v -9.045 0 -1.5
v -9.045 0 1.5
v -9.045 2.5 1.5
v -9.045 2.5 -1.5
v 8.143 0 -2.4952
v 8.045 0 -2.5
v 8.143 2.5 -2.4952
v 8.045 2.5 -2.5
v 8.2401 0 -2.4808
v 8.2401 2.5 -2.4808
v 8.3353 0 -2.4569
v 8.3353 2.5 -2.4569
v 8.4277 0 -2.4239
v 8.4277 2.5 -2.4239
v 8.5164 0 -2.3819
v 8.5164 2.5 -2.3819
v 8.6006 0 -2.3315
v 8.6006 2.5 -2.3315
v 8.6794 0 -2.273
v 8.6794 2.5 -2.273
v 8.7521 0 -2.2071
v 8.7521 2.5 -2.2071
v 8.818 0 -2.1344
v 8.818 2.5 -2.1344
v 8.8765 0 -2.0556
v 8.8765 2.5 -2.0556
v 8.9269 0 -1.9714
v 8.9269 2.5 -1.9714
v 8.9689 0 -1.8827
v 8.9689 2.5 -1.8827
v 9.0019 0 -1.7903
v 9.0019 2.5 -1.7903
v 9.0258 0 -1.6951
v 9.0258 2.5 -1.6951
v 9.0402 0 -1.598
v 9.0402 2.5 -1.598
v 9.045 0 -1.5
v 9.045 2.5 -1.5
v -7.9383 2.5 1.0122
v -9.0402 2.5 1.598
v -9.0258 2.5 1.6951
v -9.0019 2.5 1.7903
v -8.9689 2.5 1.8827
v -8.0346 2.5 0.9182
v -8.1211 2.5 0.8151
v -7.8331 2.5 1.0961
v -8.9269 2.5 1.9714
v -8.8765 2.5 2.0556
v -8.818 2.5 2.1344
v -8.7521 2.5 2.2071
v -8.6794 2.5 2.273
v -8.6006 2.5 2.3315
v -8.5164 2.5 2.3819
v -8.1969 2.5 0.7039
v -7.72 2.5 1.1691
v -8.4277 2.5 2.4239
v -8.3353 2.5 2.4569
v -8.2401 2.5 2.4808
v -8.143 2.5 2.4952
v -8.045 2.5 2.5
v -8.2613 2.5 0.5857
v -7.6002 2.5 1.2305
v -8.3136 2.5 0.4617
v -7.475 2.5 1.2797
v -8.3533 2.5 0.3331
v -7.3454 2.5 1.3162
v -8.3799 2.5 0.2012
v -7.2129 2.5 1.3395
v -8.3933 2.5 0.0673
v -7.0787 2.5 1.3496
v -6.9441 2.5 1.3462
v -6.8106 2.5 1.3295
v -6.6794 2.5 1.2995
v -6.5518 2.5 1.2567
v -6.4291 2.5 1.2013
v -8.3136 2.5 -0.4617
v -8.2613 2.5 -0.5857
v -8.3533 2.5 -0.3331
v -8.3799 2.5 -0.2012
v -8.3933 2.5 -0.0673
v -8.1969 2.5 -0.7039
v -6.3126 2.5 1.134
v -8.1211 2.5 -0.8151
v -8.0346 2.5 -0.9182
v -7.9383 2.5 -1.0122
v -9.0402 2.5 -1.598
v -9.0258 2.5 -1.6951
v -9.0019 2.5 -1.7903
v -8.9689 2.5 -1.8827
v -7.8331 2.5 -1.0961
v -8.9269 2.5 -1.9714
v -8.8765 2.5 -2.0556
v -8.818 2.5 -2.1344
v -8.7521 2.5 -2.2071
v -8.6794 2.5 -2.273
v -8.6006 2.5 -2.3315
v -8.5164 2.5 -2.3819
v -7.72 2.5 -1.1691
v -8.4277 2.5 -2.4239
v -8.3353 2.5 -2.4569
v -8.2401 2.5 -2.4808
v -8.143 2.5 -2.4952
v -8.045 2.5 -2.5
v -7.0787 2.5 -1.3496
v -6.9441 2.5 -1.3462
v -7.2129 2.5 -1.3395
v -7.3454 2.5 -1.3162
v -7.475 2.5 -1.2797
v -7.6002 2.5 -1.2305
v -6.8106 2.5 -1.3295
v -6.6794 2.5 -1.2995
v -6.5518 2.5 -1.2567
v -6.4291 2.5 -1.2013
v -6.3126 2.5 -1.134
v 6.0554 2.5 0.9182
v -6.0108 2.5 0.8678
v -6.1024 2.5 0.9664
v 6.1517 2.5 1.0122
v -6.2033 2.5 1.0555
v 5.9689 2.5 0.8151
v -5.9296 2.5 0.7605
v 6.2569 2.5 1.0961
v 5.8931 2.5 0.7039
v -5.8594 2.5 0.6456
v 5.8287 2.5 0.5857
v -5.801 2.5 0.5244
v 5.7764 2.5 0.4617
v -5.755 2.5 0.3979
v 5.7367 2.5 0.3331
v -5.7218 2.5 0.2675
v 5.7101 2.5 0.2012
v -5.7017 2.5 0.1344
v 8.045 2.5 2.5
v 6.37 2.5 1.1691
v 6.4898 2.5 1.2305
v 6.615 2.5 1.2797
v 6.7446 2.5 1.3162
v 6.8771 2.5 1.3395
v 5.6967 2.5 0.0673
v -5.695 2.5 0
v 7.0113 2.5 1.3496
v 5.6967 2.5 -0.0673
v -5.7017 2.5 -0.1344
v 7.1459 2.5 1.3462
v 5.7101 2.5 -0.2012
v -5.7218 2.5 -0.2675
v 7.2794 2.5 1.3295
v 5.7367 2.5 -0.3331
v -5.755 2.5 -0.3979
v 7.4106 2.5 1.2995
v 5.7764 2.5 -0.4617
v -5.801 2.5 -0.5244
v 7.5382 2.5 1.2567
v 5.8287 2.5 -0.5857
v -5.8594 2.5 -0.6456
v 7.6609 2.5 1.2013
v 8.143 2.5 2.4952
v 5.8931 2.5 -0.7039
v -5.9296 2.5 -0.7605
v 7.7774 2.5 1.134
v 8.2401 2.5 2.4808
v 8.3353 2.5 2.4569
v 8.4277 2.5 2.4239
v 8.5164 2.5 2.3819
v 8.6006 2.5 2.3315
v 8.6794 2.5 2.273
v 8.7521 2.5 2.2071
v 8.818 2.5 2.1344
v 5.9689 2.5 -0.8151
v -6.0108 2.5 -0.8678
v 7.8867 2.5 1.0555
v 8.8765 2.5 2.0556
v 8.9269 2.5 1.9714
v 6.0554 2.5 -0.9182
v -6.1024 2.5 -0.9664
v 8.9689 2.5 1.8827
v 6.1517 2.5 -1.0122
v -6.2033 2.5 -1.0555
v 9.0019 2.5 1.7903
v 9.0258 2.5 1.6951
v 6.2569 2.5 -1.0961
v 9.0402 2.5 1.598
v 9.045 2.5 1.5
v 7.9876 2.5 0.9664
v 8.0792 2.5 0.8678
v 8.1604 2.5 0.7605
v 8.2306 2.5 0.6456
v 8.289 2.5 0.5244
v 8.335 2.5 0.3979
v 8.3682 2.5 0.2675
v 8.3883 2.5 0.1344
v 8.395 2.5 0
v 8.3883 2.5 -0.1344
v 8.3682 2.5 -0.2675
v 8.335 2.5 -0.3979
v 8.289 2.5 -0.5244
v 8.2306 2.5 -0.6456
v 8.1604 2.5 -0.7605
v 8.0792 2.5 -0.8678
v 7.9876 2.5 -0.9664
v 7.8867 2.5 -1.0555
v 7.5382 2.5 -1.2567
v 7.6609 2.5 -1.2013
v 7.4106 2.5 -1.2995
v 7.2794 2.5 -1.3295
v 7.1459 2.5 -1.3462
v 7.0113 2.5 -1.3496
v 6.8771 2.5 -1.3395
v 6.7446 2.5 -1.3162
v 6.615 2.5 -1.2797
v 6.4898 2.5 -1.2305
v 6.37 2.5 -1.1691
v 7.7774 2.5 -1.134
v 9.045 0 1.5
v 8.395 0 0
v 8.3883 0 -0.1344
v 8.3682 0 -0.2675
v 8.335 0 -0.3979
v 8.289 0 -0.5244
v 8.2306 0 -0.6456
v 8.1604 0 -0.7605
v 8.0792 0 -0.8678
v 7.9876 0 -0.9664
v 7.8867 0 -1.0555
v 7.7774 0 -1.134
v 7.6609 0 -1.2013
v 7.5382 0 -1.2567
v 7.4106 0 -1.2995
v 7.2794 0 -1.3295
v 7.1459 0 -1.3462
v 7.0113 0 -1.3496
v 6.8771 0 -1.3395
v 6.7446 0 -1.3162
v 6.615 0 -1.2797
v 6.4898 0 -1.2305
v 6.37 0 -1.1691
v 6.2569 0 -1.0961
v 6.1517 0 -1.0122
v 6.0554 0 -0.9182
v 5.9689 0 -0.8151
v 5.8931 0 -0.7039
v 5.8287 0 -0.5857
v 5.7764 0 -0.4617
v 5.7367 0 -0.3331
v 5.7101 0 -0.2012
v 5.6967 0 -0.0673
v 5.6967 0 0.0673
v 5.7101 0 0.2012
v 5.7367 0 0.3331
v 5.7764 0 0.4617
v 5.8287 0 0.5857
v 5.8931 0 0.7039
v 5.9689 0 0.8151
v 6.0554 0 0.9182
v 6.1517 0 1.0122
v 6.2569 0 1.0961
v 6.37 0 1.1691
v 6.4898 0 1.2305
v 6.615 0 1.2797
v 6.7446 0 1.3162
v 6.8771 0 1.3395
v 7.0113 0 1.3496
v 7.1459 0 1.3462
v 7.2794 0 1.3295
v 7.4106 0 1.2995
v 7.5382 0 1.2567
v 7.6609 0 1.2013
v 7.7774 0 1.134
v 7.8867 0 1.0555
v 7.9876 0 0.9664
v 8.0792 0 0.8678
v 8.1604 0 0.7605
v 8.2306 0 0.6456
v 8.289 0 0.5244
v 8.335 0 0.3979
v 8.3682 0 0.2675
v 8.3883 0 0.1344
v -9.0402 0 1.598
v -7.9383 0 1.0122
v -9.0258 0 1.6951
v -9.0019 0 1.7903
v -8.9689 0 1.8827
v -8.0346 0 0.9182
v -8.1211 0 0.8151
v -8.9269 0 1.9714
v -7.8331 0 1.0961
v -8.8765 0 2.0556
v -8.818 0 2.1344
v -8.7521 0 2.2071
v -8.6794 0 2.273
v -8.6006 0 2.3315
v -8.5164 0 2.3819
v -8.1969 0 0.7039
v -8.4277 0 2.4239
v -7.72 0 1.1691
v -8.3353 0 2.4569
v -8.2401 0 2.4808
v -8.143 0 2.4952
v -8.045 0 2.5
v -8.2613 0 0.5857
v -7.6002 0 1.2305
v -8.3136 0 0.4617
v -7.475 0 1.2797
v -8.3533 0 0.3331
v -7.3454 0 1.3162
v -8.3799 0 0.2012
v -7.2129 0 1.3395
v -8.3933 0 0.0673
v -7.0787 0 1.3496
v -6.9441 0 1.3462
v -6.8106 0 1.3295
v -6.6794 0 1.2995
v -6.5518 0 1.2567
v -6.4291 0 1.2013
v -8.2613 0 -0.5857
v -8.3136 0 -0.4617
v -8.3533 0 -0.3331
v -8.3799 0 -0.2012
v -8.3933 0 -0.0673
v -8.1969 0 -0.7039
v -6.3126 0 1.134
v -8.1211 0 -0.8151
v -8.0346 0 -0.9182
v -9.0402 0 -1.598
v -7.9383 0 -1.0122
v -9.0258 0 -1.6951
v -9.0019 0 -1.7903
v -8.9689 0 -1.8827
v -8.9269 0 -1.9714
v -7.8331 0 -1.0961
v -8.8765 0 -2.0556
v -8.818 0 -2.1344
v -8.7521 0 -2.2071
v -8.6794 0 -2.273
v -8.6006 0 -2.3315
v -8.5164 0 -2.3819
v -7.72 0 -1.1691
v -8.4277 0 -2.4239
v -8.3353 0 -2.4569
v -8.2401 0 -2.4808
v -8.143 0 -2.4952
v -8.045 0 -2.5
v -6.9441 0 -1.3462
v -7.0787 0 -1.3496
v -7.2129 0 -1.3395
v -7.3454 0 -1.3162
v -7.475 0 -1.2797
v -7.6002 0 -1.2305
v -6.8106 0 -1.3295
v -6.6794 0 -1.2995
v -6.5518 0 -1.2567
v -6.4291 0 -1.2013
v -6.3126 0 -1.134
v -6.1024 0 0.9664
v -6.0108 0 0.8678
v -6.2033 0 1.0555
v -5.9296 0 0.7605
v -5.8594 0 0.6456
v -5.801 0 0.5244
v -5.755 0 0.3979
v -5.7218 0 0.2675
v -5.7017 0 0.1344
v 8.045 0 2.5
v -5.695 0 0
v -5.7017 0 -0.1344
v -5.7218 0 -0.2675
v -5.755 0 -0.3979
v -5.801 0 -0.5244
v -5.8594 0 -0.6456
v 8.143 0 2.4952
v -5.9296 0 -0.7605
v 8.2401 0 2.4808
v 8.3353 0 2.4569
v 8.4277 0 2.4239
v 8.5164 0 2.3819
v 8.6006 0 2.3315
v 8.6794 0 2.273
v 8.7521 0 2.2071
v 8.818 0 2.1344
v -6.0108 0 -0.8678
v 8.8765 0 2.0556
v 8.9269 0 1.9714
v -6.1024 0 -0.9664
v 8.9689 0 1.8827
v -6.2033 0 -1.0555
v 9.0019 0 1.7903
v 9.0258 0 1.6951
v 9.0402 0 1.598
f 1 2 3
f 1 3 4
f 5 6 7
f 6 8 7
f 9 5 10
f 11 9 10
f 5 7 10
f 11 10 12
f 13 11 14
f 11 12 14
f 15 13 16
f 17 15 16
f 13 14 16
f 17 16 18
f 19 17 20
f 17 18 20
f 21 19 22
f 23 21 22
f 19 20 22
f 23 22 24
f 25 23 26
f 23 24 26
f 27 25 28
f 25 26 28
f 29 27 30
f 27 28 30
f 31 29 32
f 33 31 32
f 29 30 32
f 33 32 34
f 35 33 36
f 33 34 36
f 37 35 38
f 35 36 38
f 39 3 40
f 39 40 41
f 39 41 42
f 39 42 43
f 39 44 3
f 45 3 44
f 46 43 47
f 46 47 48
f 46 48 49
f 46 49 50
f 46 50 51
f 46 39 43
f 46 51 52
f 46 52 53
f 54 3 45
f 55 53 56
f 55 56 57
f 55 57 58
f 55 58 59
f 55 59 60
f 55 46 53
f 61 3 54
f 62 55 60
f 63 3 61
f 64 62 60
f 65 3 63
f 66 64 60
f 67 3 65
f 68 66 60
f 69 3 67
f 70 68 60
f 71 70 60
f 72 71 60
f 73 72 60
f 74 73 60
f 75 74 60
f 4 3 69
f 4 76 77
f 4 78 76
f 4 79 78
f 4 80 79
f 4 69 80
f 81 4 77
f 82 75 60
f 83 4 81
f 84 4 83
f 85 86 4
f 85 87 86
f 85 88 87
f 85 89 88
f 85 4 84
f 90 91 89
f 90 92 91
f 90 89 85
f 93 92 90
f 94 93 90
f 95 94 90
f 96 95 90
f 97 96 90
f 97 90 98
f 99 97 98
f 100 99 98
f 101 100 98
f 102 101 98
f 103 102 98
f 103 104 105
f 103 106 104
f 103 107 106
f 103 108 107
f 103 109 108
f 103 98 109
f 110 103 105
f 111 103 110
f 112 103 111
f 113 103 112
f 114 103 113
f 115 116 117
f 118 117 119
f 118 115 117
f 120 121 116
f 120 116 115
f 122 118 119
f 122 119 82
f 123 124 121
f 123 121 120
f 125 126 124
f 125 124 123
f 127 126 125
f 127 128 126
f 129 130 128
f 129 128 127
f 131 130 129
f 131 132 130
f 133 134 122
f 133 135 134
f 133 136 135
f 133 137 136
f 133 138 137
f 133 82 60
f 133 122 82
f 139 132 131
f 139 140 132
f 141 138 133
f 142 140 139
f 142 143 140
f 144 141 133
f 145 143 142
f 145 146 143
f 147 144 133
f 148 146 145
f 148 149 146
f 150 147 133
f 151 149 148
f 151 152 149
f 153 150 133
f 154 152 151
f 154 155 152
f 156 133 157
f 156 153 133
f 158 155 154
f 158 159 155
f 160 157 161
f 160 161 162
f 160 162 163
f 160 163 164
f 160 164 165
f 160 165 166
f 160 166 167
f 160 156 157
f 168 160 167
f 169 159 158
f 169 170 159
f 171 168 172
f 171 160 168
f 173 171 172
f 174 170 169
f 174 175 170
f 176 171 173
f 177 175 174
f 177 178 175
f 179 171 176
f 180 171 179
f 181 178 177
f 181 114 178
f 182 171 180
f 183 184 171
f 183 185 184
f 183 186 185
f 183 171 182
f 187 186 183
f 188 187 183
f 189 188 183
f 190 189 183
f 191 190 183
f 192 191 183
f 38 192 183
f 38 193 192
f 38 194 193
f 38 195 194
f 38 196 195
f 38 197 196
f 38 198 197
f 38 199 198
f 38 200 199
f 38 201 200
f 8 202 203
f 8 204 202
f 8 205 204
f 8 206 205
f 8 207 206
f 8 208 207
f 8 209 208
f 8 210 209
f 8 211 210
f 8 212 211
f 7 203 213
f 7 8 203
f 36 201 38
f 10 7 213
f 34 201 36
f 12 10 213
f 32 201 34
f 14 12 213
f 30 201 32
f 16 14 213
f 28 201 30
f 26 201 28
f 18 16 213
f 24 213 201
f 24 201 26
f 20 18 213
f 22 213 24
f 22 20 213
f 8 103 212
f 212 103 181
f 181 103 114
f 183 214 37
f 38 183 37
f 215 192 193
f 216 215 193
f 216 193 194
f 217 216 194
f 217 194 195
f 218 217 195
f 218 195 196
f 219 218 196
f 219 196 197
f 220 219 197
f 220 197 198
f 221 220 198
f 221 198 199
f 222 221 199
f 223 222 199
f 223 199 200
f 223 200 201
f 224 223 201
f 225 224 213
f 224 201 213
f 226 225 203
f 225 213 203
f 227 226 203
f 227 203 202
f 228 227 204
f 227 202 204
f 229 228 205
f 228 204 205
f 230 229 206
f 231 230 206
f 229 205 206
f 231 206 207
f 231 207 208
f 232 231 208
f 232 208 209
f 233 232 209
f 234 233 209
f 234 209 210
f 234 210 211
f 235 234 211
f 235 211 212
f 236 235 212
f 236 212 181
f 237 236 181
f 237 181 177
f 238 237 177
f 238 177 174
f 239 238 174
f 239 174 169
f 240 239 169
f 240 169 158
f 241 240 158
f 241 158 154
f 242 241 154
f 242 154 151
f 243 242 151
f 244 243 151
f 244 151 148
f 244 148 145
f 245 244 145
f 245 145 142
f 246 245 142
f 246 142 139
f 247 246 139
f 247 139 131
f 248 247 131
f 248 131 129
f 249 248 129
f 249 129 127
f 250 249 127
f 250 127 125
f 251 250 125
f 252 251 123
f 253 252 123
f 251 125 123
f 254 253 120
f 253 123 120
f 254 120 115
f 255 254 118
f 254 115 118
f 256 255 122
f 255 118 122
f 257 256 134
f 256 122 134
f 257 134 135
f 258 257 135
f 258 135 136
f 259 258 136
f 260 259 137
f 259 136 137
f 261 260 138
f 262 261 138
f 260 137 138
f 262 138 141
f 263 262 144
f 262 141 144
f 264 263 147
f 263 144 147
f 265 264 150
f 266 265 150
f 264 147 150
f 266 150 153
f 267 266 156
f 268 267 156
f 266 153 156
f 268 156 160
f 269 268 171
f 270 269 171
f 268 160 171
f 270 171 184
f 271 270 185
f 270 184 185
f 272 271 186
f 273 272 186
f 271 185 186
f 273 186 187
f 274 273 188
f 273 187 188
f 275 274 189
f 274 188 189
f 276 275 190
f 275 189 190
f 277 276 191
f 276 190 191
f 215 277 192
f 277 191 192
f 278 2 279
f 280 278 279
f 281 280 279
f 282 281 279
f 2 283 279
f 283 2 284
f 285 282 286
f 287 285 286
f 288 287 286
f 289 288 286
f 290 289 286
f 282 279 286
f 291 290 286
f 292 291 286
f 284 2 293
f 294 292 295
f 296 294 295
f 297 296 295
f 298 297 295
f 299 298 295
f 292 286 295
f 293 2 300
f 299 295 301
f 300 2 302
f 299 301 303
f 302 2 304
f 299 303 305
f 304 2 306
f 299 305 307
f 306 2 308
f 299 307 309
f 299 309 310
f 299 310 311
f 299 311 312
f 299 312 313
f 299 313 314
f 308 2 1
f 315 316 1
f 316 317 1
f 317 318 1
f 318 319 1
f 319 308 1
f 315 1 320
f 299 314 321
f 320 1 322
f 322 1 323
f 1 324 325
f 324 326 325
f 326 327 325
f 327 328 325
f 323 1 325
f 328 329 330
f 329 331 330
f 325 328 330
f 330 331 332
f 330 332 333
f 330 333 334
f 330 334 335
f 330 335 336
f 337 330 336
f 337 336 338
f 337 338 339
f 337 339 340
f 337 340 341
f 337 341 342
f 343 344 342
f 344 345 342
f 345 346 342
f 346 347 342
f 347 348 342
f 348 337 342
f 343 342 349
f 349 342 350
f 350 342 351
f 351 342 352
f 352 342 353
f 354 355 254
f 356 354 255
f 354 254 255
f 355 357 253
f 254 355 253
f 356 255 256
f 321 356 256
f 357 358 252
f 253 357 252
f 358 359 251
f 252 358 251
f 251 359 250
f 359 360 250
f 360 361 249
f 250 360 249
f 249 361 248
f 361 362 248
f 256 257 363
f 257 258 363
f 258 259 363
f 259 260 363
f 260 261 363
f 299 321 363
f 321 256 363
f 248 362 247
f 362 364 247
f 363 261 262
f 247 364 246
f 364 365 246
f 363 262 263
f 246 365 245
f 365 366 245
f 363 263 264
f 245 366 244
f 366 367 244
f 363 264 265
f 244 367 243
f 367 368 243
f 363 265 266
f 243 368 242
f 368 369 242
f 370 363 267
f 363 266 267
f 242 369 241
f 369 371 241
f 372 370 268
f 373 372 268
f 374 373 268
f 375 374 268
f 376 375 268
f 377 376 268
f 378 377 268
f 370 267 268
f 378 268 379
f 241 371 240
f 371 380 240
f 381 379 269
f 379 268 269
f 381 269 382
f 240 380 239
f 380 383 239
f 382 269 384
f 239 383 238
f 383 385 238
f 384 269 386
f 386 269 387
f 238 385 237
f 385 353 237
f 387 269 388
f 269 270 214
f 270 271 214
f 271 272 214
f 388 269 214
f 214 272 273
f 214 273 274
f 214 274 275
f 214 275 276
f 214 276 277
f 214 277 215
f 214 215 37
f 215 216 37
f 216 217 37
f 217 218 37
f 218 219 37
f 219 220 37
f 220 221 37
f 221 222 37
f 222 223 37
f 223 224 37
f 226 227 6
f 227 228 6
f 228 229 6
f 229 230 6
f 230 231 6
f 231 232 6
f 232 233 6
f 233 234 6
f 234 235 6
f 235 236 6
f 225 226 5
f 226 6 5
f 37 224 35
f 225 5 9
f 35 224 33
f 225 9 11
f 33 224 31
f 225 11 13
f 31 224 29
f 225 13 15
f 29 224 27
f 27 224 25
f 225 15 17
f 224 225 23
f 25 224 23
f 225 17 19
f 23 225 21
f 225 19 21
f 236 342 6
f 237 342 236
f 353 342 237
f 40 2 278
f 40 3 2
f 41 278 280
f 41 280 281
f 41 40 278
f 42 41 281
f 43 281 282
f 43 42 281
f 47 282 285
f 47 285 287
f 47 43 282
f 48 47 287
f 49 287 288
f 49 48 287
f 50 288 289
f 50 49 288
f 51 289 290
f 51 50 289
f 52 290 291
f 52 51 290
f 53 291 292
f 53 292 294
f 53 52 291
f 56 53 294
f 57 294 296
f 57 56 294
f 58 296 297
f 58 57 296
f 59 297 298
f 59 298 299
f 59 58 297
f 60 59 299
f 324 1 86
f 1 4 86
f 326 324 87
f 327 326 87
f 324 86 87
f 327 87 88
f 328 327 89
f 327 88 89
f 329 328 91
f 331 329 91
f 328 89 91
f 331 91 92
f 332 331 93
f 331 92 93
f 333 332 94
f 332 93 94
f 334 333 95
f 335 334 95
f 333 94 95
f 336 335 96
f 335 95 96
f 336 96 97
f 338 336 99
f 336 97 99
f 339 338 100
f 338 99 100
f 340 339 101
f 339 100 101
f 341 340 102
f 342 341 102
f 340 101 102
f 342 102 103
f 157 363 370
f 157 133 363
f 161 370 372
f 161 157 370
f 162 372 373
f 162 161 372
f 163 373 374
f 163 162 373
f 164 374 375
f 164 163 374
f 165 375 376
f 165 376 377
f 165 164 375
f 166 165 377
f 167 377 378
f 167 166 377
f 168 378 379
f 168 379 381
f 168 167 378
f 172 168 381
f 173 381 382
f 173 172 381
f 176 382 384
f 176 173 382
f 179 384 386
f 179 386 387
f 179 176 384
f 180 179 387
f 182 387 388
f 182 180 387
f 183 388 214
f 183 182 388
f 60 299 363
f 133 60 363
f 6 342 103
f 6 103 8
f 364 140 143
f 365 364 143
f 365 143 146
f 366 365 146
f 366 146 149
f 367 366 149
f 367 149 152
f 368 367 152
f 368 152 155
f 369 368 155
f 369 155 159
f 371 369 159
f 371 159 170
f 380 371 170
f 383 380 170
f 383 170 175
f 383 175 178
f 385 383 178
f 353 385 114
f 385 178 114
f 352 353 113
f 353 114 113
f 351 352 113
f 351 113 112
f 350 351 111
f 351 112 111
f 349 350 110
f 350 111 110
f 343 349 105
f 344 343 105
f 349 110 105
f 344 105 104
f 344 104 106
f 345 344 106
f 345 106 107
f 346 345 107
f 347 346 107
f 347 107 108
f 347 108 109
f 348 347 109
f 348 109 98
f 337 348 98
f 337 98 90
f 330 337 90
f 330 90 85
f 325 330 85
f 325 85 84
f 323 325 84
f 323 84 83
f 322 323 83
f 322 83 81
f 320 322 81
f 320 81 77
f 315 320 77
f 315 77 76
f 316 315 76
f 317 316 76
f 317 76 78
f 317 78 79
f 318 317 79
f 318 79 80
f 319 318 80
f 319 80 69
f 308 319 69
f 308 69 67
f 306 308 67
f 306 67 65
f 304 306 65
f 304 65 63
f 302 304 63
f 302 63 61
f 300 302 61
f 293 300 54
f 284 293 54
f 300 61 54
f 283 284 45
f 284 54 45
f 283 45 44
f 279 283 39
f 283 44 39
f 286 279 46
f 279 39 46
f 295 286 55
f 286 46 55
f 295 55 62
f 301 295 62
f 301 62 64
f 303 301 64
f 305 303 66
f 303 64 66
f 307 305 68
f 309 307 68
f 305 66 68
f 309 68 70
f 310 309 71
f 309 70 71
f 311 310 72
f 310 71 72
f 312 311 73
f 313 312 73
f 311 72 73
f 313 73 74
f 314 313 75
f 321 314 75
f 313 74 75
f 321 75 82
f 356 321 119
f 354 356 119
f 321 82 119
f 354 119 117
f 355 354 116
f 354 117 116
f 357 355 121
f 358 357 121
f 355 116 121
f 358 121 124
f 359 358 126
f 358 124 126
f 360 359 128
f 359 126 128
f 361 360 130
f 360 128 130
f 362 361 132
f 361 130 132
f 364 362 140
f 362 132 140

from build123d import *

# Parameters (mm, degrees)
SKETCH1_W              = 18.09
SKETCH1_H              = 5
BOSS_EXTRUDE1_DEPTH    = 2.5
M2_5_CLEARANCE_HOLE1_D = 2.7
FILLET1_R              = 1


with BuildPart() as part:
    # Sketch1 → Boss-Extrude1 (new body)
    with BuildSketch(Plane(origin=(0, 0, 0), x_dir=(1, 0, 0), z_dir=(0, 1, 0))):
        Rectangle(SKETCH1_W, SKETCH1_H)
    extrude(amount=BOSS_EXTRUDE1_DEPTH)

    # M2.5 Clearance Hole1 (through all)
    with Locations(Plane(origin=(0, 0, 0), x_dir=(-1, 0, 0), z_dir=(0, -1, 0))):
        with Locations((-7.045, 0), (7.045, 0)):
            Hole(M2_5_CLEARANCE_HOLE1_D / 2)

    # Fillet1
    fillet1_edges = [part.edges().sort_by_distance(p)[0] for p in [
        (9.045, 1.25, 2.5),
        (-9.045, 1.25, 2.5),
        (-9.045, 1.25, -2.5),
        (9.045, 1.25, -2.5),
    ]]
    fillet(fillet1_edges, radius=FILLET1_R)


solid = part.part
